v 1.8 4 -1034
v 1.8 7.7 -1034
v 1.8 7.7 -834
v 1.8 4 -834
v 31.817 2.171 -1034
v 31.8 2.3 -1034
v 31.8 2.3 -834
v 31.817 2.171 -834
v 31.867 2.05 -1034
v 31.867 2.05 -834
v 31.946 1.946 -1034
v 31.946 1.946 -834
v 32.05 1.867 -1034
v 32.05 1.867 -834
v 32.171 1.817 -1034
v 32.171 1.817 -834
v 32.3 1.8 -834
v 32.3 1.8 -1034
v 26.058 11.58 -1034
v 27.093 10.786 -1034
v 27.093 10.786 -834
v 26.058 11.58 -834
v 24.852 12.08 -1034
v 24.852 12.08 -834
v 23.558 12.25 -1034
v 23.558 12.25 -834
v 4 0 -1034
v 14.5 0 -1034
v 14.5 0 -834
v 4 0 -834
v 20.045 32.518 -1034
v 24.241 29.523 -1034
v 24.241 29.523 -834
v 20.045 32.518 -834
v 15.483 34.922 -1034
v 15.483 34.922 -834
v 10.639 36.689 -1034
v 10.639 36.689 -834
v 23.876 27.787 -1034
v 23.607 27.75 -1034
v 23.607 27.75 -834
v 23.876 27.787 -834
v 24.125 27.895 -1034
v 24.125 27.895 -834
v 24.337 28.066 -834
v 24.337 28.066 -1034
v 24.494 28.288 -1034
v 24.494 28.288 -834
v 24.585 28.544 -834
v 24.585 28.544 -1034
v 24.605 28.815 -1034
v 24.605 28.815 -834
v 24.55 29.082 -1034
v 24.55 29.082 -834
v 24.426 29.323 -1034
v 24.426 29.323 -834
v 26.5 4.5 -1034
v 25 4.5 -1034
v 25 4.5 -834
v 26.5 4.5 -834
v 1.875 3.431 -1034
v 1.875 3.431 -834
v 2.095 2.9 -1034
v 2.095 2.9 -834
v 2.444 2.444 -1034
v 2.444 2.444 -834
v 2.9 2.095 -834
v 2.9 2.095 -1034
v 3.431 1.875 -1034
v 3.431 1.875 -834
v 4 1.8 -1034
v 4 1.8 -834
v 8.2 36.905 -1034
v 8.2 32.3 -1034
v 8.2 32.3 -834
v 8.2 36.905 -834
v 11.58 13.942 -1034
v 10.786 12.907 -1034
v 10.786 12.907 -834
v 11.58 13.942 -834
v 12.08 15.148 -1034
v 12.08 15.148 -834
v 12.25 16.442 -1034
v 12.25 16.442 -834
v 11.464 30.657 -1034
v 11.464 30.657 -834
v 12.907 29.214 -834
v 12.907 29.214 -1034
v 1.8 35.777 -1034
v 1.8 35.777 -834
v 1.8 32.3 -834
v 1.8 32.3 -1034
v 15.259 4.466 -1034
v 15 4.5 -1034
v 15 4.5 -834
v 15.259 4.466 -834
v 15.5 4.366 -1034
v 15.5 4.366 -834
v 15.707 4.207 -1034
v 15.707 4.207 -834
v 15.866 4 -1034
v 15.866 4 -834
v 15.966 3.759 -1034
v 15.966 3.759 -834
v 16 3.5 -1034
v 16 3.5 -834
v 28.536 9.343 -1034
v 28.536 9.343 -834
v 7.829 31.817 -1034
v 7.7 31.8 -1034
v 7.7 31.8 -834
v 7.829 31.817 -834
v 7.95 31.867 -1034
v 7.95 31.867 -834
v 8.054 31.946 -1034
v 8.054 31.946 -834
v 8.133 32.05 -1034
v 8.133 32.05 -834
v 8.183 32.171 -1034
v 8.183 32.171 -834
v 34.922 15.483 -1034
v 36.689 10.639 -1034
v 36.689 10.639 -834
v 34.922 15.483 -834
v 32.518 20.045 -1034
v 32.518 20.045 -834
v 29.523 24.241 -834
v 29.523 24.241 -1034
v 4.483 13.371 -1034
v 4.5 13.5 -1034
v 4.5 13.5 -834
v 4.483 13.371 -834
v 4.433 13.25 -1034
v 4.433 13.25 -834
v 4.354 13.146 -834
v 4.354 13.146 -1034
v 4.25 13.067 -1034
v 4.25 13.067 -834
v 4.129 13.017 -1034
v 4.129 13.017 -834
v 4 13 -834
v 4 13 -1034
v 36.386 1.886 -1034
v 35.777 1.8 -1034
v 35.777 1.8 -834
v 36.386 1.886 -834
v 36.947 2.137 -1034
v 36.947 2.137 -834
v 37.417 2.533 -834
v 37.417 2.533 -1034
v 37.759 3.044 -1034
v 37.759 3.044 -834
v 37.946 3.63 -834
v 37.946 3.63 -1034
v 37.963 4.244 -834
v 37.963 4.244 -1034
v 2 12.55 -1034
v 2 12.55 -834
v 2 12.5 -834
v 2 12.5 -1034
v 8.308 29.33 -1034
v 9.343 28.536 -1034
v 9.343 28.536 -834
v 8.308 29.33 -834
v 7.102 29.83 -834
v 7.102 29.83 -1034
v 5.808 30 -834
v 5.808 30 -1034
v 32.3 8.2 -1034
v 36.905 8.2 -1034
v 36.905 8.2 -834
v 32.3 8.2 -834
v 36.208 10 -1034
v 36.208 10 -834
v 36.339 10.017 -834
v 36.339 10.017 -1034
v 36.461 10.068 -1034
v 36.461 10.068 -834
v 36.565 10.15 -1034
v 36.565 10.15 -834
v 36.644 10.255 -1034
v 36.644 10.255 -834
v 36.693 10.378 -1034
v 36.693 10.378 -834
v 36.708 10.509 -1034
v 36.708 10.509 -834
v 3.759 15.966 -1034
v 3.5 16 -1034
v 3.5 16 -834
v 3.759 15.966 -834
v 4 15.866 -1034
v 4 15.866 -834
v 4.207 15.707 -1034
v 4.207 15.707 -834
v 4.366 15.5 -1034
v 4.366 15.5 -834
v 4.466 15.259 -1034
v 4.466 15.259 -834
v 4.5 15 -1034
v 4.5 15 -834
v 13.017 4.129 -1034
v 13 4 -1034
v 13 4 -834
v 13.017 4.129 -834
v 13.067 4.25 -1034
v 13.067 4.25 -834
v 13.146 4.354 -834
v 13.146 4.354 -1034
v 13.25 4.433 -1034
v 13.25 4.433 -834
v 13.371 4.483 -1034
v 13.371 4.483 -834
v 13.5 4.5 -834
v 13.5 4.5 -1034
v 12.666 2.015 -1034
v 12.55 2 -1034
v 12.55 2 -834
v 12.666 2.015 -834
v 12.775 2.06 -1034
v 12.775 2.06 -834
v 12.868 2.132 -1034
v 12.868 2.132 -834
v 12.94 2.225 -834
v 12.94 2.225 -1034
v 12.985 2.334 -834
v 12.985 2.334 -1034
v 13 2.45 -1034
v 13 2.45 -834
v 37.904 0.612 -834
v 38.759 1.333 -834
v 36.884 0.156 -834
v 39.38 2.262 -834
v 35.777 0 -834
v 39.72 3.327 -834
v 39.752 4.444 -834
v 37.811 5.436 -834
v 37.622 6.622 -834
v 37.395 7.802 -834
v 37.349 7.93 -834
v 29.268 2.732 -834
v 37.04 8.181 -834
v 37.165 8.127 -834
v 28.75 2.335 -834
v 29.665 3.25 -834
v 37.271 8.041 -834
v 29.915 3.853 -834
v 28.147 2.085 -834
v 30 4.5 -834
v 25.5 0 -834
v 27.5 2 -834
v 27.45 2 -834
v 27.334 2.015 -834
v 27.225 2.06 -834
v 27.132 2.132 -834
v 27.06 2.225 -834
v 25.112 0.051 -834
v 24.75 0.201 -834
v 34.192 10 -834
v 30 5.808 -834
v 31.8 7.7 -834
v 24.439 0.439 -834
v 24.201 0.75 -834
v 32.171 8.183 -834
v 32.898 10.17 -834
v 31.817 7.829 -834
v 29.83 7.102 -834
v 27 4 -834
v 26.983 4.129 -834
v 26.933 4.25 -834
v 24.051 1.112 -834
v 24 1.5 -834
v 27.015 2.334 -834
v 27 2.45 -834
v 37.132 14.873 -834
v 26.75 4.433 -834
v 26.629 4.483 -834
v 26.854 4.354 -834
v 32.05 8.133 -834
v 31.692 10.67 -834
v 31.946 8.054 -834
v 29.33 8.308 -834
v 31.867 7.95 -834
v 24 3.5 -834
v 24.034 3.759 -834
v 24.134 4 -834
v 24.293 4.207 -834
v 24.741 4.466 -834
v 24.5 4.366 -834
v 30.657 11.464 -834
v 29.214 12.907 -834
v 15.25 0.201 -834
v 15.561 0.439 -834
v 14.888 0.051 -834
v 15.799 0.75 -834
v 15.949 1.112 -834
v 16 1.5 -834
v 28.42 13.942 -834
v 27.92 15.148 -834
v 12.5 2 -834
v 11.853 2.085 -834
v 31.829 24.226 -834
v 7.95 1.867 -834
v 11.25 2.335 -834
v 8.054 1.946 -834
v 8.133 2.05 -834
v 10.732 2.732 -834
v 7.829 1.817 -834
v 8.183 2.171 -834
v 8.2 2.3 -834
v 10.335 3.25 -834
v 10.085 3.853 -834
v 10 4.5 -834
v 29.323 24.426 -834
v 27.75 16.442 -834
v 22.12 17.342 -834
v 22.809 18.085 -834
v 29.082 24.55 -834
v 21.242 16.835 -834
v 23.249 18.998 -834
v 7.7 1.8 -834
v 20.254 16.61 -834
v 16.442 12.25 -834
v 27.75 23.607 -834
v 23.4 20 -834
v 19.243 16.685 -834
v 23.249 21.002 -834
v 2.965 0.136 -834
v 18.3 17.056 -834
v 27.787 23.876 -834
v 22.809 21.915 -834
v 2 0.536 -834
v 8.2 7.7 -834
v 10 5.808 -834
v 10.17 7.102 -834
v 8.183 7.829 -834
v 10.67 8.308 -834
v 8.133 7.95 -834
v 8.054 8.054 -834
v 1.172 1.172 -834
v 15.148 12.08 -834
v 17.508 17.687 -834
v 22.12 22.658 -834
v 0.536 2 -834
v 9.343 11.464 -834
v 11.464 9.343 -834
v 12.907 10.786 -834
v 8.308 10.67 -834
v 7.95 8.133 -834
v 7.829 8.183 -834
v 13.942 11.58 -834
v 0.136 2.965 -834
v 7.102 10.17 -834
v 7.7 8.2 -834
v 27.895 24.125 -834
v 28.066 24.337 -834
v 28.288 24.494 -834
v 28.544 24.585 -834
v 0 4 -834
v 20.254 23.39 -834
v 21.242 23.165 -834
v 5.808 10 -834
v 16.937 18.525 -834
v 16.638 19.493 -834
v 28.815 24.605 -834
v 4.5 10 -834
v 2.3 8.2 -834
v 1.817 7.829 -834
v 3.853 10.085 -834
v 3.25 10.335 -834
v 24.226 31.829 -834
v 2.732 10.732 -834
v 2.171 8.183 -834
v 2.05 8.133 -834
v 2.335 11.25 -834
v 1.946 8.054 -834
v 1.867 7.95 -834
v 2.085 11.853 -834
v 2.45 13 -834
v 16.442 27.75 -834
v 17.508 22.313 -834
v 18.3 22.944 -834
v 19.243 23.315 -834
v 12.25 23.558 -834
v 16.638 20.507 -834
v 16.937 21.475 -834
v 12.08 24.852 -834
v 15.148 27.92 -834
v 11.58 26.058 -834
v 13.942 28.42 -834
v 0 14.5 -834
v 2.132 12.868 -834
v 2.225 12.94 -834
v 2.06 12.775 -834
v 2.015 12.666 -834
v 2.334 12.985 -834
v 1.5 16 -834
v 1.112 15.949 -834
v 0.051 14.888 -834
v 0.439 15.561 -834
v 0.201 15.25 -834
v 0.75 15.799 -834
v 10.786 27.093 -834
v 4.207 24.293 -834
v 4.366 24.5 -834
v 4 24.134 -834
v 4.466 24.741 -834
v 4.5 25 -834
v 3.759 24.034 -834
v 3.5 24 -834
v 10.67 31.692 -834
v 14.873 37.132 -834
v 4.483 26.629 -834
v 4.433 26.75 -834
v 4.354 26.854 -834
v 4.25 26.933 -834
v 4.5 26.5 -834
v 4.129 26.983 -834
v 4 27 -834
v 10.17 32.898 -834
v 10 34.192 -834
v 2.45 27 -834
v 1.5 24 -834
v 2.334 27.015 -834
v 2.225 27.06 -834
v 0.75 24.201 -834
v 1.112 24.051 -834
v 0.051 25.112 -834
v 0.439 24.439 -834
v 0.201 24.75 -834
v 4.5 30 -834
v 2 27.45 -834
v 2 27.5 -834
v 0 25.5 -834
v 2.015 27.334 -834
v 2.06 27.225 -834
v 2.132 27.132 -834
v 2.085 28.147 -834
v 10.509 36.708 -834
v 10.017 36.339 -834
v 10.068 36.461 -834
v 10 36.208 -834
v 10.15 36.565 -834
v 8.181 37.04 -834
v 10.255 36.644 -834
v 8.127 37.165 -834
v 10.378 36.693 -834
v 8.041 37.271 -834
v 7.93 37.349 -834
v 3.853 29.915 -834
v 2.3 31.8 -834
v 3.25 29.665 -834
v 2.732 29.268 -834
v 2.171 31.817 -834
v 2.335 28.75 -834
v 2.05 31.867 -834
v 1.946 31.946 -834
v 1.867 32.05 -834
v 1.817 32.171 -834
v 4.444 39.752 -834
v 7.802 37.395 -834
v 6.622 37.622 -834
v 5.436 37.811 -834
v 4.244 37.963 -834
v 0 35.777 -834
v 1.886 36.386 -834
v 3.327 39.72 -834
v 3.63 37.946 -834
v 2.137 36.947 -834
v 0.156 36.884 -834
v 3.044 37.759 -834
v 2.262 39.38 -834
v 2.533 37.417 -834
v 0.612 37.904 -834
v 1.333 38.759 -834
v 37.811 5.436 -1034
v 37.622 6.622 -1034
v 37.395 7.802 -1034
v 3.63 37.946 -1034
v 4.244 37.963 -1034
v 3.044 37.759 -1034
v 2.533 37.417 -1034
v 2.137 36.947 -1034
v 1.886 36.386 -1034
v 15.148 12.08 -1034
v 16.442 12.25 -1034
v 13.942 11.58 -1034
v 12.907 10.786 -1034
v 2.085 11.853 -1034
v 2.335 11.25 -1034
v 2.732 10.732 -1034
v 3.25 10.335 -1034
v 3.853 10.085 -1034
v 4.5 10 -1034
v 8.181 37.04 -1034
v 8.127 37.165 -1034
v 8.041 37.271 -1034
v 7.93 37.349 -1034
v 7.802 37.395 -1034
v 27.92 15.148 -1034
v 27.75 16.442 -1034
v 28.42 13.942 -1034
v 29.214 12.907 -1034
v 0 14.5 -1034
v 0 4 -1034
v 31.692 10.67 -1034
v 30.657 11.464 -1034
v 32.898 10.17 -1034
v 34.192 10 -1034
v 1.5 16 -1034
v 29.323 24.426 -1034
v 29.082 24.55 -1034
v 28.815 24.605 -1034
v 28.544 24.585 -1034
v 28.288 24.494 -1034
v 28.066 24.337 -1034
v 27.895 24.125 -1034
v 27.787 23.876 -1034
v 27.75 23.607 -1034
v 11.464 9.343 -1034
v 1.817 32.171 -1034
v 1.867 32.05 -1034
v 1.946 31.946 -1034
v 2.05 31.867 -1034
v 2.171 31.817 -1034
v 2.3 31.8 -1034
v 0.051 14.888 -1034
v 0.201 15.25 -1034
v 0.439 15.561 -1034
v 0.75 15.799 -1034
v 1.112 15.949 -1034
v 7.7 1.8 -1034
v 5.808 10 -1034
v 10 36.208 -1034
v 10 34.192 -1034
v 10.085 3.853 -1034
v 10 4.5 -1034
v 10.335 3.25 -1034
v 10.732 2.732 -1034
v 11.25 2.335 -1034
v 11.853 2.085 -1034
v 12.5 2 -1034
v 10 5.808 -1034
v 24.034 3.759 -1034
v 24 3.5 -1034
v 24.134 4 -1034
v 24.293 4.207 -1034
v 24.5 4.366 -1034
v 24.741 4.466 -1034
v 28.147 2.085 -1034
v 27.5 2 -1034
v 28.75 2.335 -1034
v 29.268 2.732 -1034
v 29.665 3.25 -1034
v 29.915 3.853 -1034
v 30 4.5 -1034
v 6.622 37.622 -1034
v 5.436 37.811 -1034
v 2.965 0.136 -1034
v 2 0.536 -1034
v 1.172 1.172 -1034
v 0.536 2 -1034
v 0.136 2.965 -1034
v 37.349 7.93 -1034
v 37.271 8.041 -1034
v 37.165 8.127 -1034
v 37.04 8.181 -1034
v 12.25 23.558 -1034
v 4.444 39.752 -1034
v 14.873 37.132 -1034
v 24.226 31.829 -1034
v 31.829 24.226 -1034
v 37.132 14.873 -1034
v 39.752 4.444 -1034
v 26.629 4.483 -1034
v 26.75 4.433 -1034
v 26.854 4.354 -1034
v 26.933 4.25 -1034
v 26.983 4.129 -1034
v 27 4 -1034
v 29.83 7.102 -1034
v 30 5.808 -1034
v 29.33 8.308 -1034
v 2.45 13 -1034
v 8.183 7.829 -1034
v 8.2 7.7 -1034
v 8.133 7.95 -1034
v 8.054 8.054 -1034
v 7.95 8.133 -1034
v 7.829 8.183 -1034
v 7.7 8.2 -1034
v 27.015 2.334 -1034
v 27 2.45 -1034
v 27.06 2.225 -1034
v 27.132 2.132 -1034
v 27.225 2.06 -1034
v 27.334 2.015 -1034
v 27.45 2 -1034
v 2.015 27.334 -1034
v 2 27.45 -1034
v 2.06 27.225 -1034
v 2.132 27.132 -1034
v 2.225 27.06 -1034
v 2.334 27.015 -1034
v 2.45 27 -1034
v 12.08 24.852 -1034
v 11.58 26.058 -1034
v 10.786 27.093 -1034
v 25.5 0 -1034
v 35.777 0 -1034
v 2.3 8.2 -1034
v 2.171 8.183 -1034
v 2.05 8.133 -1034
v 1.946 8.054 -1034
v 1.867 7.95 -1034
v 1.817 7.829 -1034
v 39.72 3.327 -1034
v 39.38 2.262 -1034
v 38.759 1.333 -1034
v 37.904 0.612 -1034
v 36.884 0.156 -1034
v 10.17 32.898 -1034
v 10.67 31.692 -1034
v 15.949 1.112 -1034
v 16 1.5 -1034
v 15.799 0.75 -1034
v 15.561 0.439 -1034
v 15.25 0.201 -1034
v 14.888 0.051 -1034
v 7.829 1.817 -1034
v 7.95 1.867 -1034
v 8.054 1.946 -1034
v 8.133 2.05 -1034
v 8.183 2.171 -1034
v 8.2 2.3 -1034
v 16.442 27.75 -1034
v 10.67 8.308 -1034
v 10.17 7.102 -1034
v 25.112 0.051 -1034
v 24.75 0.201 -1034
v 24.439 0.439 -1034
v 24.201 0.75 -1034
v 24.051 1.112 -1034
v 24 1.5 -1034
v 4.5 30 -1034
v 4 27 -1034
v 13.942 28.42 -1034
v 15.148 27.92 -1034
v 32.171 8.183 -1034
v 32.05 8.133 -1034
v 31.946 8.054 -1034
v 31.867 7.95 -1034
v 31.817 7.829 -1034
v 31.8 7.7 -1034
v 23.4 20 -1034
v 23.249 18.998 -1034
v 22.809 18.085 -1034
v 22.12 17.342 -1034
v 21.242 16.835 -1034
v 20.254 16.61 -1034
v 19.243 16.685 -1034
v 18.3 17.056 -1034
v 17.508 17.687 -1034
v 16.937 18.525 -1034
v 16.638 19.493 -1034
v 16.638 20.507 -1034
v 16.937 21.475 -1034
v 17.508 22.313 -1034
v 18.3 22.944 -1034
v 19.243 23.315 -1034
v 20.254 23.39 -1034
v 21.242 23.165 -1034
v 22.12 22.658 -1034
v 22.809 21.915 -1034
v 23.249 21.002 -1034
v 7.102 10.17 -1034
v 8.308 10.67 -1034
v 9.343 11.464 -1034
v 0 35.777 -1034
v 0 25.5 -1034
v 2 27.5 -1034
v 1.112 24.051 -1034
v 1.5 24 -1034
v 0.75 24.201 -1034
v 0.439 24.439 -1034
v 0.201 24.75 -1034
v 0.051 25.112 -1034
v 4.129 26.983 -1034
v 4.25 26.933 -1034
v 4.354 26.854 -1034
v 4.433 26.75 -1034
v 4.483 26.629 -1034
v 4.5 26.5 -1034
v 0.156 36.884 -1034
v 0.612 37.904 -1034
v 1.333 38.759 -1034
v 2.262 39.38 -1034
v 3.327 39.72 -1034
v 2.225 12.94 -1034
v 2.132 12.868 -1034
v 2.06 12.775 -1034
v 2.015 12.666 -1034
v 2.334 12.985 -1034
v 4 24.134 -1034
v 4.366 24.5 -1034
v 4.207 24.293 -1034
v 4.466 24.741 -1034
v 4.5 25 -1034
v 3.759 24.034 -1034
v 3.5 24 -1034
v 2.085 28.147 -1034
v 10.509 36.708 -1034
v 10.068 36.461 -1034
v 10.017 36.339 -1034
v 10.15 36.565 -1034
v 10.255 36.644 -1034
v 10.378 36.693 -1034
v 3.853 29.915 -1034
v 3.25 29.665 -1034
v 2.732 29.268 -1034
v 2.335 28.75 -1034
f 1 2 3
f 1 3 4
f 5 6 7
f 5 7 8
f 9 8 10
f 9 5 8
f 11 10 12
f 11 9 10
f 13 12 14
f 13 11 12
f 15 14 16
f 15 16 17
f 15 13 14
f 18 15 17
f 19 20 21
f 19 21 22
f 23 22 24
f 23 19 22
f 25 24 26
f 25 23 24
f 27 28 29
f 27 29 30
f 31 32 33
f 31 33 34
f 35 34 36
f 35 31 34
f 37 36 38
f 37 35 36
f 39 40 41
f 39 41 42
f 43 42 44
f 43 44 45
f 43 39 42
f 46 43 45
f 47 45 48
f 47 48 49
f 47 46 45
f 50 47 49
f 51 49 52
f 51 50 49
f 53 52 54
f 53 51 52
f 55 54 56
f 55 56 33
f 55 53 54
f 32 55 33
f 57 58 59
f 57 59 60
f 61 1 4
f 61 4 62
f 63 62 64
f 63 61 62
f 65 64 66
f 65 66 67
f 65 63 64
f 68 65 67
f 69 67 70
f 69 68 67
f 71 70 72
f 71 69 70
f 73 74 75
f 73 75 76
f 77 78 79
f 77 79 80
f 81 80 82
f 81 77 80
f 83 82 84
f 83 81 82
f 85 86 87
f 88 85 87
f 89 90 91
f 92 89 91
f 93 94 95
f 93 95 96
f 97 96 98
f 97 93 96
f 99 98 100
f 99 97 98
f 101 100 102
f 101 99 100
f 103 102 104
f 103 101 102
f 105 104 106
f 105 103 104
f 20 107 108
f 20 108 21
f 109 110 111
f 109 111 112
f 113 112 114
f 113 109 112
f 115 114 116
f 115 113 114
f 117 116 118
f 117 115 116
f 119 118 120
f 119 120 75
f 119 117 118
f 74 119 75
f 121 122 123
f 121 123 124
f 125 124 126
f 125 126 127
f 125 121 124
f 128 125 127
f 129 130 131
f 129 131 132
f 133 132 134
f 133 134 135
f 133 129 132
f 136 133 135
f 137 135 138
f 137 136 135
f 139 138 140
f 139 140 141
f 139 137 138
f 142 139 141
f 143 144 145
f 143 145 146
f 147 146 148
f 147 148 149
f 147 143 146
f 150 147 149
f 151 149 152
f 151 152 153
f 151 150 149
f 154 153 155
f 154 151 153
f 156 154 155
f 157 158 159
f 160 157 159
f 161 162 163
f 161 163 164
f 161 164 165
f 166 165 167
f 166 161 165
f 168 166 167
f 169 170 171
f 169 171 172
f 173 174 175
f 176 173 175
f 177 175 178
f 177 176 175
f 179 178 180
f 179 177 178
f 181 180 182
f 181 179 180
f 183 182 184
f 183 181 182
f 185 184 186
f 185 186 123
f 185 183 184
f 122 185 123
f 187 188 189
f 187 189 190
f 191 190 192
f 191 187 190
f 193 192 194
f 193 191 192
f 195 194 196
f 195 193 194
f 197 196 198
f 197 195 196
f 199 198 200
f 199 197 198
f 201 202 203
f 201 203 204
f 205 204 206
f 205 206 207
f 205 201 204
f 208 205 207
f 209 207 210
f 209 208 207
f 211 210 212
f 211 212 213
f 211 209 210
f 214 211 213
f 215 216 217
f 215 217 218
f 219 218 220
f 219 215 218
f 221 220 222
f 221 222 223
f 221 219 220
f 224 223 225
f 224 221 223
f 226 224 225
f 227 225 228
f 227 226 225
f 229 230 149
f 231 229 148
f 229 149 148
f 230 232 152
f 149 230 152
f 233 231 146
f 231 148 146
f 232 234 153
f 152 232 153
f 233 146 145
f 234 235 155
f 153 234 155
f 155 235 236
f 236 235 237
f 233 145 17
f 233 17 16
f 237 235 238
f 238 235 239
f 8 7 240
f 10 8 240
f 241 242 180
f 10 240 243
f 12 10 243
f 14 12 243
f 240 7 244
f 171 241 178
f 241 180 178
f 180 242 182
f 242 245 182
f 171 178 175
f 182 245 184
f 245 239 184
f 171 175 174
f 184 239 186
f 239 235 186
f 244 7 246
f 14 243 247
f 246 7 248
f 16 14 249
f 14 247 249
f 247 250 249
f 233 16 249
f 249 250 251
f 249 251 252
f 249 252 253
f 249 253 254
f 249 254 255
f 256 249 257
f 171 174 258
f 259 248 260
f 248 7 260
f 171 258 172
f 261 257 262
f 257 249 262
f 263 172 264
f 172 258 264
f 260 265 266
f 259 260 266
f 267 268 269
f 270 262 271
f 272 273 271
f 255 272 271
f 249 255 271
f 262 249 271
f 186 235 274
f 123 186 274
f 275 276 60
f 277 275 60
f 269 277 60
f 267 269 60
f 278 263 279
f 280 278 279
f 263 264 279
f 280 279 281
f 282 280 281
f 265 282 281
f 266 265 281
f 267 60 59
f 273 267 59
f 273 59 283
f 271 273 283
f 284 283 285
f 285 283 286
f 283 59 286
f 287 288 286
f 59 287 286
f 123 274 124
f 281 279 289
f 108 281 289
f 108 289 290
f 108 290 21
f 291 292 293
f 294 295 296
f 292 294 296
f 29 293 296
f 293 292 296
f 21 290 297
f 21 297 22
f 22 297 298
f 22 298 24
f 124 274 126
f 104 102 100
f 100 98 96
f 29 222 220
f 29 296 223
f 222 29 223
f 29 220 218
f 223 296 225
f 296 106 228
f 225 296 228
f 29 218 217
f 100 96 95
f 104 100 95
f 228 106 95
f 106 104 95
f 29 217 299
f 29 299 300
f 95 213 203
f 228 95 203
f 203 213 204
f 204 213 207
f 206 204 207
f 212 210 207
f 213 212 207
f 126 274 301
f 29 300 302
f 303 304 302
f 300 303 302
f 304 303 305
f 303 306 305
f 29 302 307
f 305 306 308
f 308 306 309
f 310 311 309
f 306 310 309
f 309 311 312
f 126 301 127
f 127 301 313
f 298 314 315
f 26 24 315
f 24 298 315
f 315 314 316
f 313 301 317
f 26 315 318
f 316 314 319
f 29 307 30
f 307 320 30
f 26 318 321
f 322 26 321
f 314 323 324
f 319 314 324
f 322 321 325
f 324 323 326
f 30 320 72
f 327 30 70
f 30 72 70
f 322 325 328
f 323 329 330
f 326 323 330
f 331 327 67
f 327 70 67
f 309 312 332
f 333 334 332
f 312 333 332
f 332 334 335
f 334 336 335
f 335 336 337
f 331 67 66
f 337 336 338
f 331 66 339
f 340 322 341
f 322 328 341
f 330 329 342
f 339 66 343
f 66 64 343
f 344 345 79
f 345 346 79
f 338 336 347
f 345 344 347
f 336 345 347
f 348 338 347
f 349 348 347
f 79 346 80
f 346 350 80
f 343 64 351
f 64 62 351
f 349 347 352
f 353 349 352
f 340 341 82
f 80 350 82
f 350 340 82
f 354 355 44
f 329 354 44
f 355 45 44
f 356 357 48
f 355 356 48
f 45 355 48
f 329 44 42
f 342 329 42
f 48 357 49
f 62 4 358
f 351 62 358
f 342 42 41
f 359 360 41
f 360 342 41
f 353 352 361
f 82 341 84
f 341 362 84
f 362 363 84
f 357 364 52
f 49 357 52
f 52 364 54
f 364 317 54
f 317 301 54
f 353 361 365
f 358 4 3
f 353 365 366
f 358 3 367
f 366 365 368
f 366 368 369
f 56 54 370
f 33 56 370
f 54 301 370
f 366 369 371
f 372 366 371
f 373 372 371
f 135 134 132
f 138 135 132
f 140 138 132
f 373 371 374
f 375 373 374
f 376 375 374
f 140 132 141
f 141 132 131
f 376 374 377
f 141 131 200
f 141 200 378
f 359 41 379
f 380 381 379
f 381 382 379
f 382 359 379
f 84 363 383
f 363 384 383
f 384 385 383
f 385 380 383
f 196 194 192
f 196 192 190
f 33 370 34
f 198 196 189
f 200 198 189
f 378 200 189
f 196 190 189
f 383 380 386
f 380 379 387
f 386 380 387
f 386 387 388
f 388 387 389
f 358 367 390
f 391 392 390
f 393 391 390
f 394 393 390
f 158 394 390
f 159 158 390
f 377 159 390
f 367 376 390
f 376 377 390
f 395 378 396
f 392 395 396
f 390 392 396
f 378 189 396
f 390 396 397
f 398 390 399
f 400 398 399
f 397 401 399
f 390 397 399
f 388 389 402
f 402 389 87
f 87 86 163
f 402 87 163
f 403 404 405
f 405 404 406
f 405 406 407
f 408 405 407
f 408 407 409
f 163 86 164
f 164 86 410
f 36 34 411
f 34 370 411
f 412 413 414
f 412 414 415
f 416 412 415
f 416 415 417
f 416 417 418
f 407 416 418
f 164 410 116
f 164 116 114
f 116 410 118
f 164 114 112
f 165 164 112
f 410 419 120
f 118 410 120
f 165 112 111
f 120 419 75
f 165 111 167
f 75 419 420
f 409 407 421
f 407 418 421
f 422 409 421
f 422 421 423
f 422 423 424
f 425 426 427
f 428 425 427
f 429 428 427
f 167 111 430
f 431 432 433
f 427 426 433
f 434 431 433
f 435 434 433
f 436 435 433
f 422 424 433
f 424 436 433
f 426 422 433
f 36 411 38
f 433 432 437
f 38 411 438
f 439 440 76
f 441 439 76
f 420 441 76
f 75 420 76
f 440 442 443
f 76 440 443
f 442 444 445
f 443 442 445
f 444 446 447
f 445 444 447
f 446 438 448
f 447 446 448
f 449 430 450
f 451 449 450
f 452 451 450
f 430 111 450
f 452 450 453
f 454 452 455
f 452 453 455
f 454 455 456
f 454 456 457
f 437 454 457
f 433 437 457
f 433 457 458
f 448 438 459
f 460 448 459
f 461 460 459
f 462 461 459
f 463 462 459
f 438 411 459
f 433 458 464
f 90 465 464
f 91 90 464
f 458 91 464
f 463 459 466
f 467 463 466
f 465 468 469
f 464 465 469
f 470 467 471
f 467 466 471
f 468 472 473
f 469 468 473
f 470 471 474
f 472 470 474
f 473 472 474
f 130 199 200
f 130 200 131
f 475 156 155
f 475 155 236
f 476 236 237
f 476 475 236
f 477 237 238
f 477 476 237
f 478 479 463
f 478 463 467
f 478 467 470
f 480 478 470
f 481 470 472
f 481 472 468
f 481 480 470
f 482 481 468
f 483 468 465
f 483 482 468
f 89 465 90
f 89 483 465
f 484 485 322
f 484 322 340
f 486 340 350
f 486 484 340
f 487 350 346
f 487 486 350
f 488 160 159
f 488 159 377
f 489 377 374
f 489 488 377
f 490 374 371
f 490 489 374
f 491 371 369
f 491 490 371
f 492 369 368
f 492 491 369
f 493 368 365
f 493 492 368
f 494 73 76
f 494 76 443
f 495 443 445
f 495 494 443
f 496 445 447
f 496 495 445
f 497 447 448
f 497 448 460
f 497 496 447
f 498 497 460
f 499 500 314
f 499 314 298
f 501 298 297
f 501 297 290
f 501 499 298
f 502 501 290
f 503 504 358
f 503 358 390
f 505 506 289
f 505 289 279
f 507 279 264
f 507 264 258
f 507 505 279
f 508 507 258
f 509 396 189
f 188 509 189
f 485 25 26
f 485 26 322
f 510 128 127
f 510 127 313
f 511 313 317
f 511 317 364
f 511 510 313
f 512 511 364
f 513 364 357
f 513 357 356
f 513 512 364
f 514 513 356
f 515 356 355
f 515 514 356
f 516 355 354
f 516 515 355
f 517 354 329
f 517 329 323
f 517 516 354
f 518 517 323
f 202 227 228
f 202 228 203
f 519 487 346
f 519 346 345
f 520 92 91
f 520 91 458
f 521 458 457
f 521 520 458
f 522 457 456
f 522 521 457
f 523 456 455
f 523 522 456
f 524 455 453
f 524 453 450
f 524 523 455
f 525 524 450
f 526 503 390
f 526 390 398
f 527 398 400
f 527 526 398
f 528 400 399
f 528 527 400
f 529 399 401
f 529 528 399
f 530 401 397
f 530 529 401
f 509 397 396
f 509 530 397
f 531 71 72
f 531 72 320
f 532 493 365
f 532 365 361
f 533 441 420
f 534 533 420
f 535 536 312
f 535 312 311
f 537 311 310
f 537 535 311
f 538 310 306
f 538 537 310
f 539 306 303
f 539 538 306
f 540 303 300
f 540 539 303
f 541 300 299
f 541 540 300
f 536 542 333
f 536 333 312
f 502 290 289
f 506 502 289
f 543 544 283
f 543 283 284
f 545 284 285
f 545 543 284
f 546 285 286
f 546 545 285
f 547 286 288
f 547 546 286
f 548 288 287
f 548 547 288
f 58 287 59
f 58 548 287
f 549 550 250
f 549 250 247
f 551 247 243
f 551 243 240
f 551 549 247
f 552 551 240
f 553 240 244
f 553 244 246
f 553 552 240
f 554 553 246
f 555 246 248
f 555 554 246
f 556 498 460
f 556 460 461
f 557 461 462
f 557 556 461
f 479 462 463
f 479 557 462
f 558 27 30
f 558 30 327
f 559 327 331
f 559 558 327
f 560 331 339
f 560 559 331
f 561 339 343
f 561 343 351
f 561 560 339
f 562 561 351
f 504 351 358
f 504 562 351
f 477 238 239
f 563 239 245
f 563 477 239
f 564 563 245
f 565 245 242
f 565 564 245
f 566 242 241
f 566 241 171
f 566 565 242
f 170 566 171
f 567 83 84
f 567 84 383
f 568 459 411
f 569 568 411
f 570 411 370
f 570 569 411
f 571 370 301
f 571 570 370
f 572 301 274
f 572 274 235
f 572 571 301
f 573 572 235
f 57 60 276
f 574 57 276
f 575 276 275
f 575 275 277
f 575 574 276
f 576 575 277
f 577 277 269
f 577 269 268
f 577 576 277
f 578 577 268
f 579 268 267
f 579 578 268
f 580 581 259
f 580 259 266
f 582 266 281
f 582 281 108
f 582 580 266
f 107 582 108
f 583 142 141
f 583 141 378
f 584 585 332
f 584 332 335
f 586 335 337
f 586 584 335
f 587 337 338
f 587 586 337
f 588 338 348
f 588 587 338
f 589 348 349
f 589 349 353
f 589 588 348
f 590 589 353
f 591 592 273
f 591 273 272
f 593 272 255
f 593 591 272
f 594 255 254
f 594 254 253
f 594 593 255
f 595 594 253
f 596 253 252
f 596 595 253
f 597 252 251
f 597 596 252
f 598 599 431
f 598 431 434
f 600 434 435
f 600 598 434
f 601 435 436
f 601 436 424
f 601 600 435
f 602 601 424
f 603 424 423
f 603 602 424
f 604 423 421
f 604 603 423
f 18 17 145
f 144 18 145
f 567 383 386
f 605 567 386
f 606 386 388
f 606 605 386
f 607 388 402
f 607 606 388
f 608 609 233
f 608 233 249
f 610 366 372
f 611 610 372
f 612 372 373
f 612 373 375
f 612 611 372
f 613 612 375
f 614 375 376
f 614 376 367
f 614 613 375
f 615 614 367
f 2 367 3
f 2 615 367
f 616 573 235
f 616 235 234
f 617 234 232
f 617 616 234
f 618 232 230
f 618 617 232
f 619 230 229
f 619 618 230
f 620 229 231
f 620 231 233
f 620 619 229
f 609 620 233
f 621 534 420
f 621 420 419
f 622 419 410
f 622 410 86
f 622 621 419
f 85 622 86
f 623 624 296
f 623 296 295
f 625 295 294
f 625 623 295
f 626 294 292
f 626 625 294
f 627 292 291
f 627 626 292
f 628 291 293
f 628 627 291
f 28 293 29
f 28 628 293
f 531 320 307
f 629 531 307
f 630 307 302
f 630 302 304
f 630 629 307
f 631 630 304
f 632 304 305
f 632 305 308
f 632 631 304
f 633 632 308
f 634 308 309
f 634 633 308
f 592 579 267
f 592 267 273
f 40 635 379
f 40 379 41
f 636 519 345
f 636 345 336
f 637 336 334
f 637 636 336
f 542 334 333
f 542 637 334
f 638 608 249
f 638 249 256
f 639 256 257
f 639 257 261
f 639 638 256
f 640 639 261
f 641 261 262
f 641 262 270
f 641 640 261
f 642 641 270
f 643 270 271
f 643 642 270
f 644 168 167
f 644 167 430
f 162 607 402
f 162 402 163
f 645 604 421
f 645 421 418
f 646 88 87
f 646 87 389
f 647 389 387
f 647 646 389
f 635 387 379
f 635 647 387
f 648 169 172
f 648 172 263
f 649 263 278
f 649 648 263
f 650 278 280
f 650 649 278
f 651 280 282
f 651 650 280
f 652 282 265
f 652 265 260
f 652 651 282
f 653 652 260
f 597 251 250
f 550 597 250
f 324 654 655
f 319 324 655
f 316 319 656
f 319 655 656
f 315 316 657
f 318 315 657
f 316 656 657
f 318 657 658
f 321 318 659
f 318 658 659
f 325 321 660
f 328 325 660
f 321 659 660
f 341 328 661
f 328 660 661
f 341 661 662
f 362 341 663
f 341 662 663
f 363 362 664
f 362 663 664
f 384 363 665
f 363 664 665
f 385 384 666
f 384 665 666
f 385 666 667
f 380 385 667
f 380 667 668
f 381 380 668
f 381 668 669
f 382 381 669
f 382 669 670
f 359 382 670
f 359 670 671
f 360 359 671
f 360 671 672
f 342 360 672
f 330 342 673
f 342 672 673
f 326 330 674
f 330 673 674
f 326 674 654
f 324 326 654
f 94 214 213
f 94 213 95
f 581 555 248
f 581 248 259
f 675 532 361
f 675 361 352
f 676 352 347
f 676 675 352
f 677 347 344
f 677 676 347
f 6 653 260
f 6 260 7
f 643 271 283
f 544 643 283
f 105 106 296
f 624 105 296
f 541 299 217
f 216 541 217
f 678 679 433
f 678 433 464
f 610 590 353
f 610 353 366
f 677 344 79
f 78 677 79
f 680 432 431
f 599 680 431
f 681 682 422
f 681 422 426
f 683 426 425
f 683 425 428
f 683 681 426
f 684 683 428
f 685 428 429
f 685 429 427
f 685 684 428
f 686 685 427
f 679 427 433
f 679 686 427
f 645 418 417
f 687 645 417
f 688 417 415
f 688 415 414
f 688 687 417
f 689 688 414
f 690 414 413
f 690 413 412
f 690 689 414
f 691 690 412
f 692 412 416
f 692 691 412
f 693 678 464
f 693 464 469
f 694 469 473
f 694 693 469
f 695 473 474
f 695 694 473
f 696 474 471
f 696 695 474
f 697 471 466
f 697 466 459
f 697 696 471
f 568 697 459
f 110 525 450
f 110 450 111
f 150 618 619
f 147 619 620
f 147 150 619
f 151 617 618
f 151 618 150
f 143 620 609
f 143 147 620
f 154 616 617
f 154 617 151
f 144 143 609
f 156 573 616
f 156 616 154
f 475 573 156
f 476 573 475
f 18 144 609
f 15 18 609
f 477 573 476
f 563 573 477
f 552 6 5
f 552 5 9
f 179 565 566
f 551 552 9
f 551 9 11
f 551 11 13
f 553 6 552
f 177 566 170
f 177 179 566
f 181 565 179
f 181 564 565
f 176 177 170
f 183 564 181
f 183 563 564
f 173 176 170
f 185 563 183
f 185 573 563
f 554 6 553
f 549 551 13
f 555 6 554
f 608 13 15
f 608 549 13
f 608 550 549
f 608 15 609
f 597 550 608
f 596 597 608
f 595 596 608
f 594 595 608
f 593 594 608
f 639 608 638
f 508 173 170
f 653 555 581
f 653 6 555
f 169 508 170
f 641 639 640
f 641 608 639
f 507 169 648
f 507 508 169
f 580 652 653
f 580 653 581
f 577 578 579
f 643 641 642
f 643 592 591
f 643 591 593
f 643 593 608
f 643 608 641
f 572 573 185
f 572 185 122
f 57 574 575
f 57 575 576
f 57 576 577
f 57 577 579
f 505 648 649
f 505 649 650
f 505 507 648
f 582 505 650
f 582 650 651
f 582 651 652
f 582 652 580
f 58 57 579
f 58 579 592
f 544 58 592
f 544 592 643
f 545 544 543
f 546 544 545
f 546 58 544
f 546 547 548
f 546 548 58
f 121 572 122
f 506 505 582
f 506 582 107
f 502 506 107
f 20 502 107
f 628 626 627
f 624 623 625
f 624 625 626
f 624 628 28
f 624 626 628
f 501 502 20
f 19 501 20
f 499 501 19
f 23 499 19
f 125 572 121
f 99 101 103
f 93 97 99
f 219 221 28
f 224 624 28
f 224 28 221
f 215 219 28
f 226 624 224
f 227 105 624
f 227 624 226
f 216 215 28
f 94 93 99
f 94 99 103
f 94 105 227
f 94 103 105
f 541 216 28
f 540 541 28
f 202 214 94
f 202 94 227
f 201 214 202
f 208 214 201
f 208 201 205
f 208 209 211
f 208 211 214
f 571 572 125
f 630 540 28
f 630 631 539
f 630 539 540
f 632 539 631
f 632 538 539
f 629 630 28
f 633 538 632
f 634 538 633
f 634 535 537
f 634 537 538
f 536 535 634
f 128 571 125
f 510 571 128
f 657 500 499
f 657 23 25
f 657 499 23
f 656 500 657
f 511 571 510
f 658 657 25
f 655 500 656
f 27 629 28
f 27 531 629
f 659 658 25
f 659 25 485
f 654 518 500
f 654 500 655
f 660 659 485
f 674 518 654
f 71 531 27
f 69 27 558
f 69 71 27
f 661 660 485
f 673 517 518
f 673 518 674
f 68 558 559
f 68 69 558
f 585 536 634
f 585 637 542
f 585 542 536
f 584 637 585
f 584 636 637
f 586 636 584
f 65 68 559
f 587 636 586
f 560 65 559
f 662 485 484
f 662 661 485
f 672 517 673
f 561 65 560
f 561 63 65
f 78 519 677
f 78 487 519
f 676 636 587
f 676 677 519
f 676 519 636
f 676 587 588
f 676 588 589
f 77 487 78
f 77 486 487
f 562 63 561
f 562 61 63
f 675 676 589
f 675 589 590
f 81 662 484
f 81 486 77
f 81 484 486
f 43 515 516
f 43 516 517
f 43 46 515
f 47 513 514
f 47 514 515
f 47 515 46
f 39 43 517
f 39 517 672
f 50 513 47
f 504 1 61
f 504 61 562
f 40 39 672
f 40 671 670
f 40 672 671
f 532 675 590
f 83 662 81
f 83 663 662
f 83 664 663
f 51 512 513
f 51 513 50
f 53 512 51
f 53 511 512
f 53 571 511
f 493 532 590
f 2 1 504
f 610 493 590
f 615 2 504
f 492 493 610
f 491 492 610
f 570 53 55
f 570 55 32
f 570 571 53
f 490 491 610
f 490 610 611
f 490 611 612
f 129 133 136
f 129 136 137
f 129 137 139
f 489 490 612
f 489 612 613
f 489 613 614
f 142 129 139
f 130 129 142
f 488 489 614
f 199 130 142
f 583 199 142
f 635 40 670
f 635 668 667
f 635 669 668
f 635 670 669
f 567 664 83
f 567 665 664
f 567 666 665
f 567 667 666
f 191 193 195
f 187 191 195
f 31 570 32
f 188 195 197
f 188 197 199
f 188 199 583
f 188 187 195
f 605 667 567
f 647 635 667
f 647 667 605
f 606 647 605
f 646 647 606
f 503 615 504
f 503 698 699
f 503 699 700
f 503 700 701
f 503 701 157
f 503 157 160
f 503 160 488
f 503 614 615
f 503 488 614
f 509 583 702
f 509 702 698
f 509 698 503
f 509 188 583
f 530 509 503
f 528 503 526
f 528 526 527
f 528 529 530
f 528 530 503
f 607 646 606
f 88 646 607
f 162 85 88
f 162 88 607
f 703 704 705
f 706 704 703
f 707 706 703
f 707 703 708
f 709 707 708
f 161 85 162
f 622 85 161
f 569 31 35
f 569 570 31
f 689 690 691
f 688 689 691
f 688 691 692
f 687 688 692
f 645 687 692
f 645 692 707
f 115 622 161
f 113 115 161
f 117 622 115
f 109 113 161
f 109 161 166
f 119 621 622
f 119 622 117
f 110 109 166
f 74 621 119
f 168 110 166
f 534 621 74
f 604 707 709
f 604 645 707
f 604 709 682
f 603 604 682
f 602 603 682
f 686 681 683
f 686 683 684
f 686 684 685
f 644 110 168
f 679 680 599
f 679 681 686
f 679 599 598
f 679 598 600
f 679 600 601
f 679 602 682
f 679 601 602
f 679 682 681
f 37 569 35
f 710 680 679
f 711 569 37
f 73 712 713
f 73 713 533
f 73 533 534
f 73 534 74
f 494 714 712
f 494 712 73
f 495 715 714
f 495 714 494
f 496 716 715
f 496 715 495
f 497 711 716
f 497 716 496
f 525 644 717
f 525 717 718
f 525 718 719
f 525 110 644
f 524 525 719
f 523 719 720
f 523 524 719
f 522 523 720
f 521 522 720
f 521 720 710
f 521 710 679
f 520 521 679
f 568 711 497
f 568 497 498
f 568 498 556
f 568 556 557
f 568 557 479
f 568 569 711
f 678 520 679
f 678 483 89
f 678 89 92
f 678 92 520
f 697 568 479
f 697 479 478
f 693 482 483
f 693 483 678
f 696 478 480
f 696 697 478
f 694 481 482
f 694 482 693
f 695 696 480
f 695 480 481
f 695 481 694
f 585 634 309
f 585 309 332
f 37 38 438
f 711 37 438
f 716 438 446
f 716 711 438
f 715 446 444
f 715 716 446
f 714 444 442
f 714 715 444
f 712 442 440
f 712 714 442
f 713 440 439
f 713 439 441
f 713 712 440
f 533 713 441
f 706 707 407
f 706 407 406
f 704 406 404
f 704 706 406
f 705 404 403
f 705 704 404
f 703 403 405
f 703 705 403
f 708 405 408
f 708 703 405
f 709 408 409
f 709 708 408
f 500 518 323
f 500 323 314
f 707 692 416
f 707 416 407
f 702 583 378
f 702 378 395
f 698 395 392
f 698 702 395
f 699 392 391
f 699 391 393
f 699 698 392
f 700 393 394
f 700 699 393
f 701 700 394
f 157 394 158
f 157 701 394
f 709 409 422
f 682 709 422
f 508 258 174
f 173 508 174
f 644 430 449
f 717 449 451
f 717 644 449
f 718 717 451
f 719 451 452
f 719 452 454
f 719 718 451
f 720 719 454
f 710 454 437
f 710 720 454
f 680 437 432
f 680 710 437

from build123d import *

# Parameters (mm, degrees)
SCHIZZO1_R                   = 3.4
ESTRUSIONE_ESTRUSIONE1_DEPTH = 200


with BuildPart() as part:
    # Schizzo1 → Estrusione-Estrusione1 (new body)
    with BuildSketch(Plane(origin=(0, 0, -1034), x_dir=(-1, 0, 0), z_dir=(0, 0, -1))):
        with BuildLine():
            Line((-16, 3.5), (-16, 1.5))
            ThreePointArc((-16, 1.5), (-15.560660172, 0.439339828), (-14.5, 0))
            Line((-14.5, 0), (-4, 0))
            ThreePointArc((-4, 0), (-1.171572875, 1.171572875), (0, 4))
            Line((0, 4), (0, 14.5))
            ThreePointArc((0, 14.5), (-0.439339828, 15.560660172), (-1.5, 16))
            Line((-1.5, 16), (-3.5, 16))
            ThreePointArc((-3.5, 16), (-4.207106781, 15.707106781), (-4.5, 15))
            Line((-4.5, 15), (-4.5, 13.5))
            ThreePointArc((-4.5, 13.5), (-4.353553391, 13.146446609), (-4, 13))
            Line((-4, 13), (-2.45, 13))
            ThreePointArc((-2.45, 13), (-2.131801948, 12.868198052), (-2, 12.55))
            Line((-2, 12.55), (-2, 12.5))
            ThreePointArc((-2, 12.5), (-2.732233047, 10.732233047), (-4.5, 10))
            Line((-4.5, 10), (-5.807611845, 10))
            ThreePointArc((-5.807611845, 10), (-7.721029007, 10.380602337), (-9.343145751, 11.464466094))
            Line((-9.343145751, 11.464466094), (-10.785533906, 12.906854249))
            ThreePointArc((-10.785533906, 12.906854249), (-11.869397663, 14.528970994), (-12.25, 16.442388155))
            Line((-12.25, 16.442388155), (-12.25, 23.557611845))
            ThreePointArc((-12.25, 23.557611845), (-11.869397663, 25.471029006), (-10.785533906, 27.09314575))
            Line((-10.785533906, 27.09314575), (-9.343145751, 28.535533906))
            ThreePointArc((-9.343145751, 28.535533906), (-7.721029006, 29.619397663), (-5.807611845, 30))
            Line((-5.807611845, 30), (-4.5, 30))
            ThreePointArc((-4.5, 30), (-2.732233047, 29.267766953), (-2, 27.5))
            Line((-2, 27.5), (-2, 27.45))
            ThreePointArc((-2, 27.45), (-2.131801948, 27.131801948), (-2.45, 27))
            Line((-2.45, 27), (-4, 27))
            ThreePointArc((-4, 27), (-4.353553391, 26.853553391), (-4.5, 26.5))
            Line((-4.5, 26.5), (-4.5, 25))
            ThreePointArc((-4.5, 25), (-4.207106781, 24.292893219), (-3.5, 24))
            Line((-3.5, 24), (-1.5, 24))
            ThreePointArc((-1.5, 24), (-0.439339828, 24.439339828), (0, 25.5))
            Line((0, 25.5), (0, 35.77708764))
            ThreePointArc((0, 35.77708764), (-1.333333333, 38.75851161), (-4.444444444, 39.7523196))
            ThreePointArc((-4.444444444, 39.7523196), (-28.284271247, 28.284271247), (-39.7523196, 4.444444444))
            ThreePointArc((-39.7523196, 4.444444444), (-38.75851161, 1.333333333), (-35.77708764, 0))
            Line((-35.77708764, 0), (-25.5, 0))
            ThreePointArc((-25.5, 0), (-24.439339828, 0.439339828), (-24, 1.5))
            Line((-24, 1.5), (-24, 3.5))
            ThreePointArc((-24, 3.5), (-24.292893219, 4.207106781), (-25, 4.5))
            Line((-25, 4.5), (-26.5, 4.5))
            ThreePointArc((-26.5, 4.5), (-26.853553391, 4.353553391), (-27, 4))
            Line((-27, 4), (-27, 2.45))
            ThreePointArc((-27, 2.45), (-27.131801948, 2.131801948), (-27.45, 2))
            Line((-27.45, 2), (-27.5, 2))
            ThreePointArc((-27.5, 2), (-29.267766953, 2.732233047), (-30, 4.5))
            Line((-30, 4.5), (-30, 5.807611845))
            ThreePointArc((-30, 5.807611845), (-29.619397663, 7.721029006), (-28.535533906, 9.343145751))
            Line((-28.535533906, 9.343145751), (-27.09314575, 10.785533906))
            ThreePointArc((-27.09314575, 10.785533906), (-25.471029006, 11.869397663), (-23.557611845, 12.25))
            Line((-23.557611845, 12.25), (-16.442388155, 12.25))
            ThreePointArc((-16.442388155, 12.25), (-14.528970994, 11.869397663), (-12.90685425, 10.785533906))
            Line((-12.90685425, 10.785533906), (-11.464466094, 9.343145751))
            ThreePointArc((-11.464466094, 9.343145751), (-10.380602337, 7.721029006), (-10, 5.807611845))
            Line((-10, 5.807611845), (-10, 4.5))
            ThreePointArc((-10, 4.5), (-10.732233047, 2.732233047), (-12.5, 2))
            Line((-12.5, 2), (-12.55, 2))
            ThreePointArc((-12.55, 2), (-12.868198052, 2.131801948), (-13, 2.45))
            Line((-13, 2.45), (-13, 4))
            ThreePointArc((-13, 4), (-13.146446609, 4.353553391), (-13.5, 4.5))
            Line((-13.5, 4.5), (-15, 4.5))
            ThreePointArc((-15, 4.5), (-15.707106781, 4.207106781), (-16, 3.5))
        make_face()
        with Locations(Location((-20, 20, 0), (0, 0, 180))):
            Circle(SCHIZZO1_R, mode=Mode.SUBTRACT)
        with BuildLine():
            Line((-8.2, 32.3), (-8.2, 36.905284174))
            ThreePointArc((-8.2, 36.905284174), (-8.087982608, 37.220672025), (-7.802122016, 37.394744177))
            ThreePointArc((-7.802122016, 37.394744177), (-6.029991855, 37.721071011), (-4.244444444, 37.963465218))
            ThreePointArc((-4.244444444, 37.963465218), (-2.533333333, 37.416870823), (-1.8, 35.77708764))
            Line((-1.8, 35.77708764), (-1.8, 32.3))
            ThreePointArc((-1.8, 32.3), (-1.946446609, 31.946446609), (-2.3, 31.8))
            Line((-2.3, 31.8), (-7.7, 31.8))
            ThreePointArc((-7.7, 31.8), (-8.053553391, 31.946446609), (-8.2, 32.3))
        make_face(mode=Mode.SUBTRACT)
        with BuildLine():
            Line((-4, 1.8), (-7.7, 1.8))
            ThreePointArc((-7.7, 1.8), (-8.053553391, 1.946446609), (-8.2, 2.3))
            Line((-8.2, 2.3), (-8.2, 7.7))
            ThreePointArc((-8.2, 7.7), (-8.053553391, 8.053553391), (-7.7, 8.2))
            Line((-7.7, 8.2), (-2.3, 8.2))
            ThreePointArc((-2.3, 8.2), (-1.946446609, 8.053553391), (-1.8, 7.7))
            Line((-1.8, 7.7), (-1.8, 4))
            ThreePointArc((-1.8, 4), (-2.444365081, 2.444365081), (-4, 1.8))
        make_face(mode=Mode.SUBTRACT)
        with BuildLine():
            Line((-27.75, 23.606725737), (-27.75, 16.442388155))
            ThreePointArc((-27.75, 16.442388155), (-28.130602337, 14.528970994), (-29.214466094, 12.906854249))
            Line((-29.214466094, 12.906854249), (-30.656854249, 11.464466094))
            ThreePointArc((-30.656854249, 11.464466094), (-32.278970994, 10.380602337), (-34.192388155, 10))
            Line((-34.192388155, 10), (-36.208286344, 10))
            ThreePointArc((-36.208286344, 10), (-36.608054182, 10.199690699), (-36.688502344, 10.639257294))
            ThreePointArc((-36.688502344, 10.639257294), (-33.797037909, 17.804500235), (-29.522849462, 24.241315138))
            ThreePointArc((-29.522849462, 24.241315138), (-28.412990699, 24.548227054), (-27.75, 23.606725737))
        make_face(mode=Mode.SUBTRACT)
        with BuildLine():
            Line((-10, 36.208286344), (-10, 34.192388155))
            ThreePointArc((-10, 34.192388155), (-10.380602337, 32.278970994), (-11.464466094, 30.656854249))
            Line((-11.464466094, 30.656854249), (-12.906854249, 29.214466094))
            ThreePointArc((-12.906854249, 29.214466094), (-14.528970994, 28.130602337), (-16.442388155, 27.75))
            Line((-16.442388155, 27.75), (-23.606725737, 27.75))
            ThreePointArc((-23.606725737, 27.75), (-24.548227054, 28.412990699), (-24.241315138, 29.522849462))
            ThreePointArc((-24.241315138, 29.522849462), (-17.804500235, 33.797037909), (-10.639257294, 36.688502344))
            ThreePointArc((-10.639257294, 36.688502344), (-10.199690699, 36.608054182), (-10, 36.208286344))
        make_face(mode=Mode.SUBTRACT)
        with BuildLine():
            Line((-36.905284174, 8.2), (-32.3, 8.2))
            ThreePointArc((-32.3, 8.2), (-31.946446609, 8.053553391), (-31.8, 7.7))
            Line((-31.8, 7.7), (-31.8, 2.3))
            ThreePointArc((-31.8, 2.3), (-31.946446609, 1.946446609), (-32.3, 1.8))
            Line((-32.3, 1.8), (-35.77708764, 1.8))
            ThreePointArc((-35.77708764, 1.8), (-37.416870823, 2.533333333), (-37.963465218, 4.244444444))
            ThreePointArc((-37.963465218, 4.244444444), (-37.721071011, 6.029991855), (-37.394744177, 7.802122016))
            ThreePointArc((-37.394744177, 7.802122016), (-37.220672025, 8.087982608), (-36.905284174, 8.2))
        make_face(mode=Mode.SUBTRACT)
    extrude(amount=-ESTRUSIONE_ESTRUSIONE1_DEPTH)


solid = part.part
